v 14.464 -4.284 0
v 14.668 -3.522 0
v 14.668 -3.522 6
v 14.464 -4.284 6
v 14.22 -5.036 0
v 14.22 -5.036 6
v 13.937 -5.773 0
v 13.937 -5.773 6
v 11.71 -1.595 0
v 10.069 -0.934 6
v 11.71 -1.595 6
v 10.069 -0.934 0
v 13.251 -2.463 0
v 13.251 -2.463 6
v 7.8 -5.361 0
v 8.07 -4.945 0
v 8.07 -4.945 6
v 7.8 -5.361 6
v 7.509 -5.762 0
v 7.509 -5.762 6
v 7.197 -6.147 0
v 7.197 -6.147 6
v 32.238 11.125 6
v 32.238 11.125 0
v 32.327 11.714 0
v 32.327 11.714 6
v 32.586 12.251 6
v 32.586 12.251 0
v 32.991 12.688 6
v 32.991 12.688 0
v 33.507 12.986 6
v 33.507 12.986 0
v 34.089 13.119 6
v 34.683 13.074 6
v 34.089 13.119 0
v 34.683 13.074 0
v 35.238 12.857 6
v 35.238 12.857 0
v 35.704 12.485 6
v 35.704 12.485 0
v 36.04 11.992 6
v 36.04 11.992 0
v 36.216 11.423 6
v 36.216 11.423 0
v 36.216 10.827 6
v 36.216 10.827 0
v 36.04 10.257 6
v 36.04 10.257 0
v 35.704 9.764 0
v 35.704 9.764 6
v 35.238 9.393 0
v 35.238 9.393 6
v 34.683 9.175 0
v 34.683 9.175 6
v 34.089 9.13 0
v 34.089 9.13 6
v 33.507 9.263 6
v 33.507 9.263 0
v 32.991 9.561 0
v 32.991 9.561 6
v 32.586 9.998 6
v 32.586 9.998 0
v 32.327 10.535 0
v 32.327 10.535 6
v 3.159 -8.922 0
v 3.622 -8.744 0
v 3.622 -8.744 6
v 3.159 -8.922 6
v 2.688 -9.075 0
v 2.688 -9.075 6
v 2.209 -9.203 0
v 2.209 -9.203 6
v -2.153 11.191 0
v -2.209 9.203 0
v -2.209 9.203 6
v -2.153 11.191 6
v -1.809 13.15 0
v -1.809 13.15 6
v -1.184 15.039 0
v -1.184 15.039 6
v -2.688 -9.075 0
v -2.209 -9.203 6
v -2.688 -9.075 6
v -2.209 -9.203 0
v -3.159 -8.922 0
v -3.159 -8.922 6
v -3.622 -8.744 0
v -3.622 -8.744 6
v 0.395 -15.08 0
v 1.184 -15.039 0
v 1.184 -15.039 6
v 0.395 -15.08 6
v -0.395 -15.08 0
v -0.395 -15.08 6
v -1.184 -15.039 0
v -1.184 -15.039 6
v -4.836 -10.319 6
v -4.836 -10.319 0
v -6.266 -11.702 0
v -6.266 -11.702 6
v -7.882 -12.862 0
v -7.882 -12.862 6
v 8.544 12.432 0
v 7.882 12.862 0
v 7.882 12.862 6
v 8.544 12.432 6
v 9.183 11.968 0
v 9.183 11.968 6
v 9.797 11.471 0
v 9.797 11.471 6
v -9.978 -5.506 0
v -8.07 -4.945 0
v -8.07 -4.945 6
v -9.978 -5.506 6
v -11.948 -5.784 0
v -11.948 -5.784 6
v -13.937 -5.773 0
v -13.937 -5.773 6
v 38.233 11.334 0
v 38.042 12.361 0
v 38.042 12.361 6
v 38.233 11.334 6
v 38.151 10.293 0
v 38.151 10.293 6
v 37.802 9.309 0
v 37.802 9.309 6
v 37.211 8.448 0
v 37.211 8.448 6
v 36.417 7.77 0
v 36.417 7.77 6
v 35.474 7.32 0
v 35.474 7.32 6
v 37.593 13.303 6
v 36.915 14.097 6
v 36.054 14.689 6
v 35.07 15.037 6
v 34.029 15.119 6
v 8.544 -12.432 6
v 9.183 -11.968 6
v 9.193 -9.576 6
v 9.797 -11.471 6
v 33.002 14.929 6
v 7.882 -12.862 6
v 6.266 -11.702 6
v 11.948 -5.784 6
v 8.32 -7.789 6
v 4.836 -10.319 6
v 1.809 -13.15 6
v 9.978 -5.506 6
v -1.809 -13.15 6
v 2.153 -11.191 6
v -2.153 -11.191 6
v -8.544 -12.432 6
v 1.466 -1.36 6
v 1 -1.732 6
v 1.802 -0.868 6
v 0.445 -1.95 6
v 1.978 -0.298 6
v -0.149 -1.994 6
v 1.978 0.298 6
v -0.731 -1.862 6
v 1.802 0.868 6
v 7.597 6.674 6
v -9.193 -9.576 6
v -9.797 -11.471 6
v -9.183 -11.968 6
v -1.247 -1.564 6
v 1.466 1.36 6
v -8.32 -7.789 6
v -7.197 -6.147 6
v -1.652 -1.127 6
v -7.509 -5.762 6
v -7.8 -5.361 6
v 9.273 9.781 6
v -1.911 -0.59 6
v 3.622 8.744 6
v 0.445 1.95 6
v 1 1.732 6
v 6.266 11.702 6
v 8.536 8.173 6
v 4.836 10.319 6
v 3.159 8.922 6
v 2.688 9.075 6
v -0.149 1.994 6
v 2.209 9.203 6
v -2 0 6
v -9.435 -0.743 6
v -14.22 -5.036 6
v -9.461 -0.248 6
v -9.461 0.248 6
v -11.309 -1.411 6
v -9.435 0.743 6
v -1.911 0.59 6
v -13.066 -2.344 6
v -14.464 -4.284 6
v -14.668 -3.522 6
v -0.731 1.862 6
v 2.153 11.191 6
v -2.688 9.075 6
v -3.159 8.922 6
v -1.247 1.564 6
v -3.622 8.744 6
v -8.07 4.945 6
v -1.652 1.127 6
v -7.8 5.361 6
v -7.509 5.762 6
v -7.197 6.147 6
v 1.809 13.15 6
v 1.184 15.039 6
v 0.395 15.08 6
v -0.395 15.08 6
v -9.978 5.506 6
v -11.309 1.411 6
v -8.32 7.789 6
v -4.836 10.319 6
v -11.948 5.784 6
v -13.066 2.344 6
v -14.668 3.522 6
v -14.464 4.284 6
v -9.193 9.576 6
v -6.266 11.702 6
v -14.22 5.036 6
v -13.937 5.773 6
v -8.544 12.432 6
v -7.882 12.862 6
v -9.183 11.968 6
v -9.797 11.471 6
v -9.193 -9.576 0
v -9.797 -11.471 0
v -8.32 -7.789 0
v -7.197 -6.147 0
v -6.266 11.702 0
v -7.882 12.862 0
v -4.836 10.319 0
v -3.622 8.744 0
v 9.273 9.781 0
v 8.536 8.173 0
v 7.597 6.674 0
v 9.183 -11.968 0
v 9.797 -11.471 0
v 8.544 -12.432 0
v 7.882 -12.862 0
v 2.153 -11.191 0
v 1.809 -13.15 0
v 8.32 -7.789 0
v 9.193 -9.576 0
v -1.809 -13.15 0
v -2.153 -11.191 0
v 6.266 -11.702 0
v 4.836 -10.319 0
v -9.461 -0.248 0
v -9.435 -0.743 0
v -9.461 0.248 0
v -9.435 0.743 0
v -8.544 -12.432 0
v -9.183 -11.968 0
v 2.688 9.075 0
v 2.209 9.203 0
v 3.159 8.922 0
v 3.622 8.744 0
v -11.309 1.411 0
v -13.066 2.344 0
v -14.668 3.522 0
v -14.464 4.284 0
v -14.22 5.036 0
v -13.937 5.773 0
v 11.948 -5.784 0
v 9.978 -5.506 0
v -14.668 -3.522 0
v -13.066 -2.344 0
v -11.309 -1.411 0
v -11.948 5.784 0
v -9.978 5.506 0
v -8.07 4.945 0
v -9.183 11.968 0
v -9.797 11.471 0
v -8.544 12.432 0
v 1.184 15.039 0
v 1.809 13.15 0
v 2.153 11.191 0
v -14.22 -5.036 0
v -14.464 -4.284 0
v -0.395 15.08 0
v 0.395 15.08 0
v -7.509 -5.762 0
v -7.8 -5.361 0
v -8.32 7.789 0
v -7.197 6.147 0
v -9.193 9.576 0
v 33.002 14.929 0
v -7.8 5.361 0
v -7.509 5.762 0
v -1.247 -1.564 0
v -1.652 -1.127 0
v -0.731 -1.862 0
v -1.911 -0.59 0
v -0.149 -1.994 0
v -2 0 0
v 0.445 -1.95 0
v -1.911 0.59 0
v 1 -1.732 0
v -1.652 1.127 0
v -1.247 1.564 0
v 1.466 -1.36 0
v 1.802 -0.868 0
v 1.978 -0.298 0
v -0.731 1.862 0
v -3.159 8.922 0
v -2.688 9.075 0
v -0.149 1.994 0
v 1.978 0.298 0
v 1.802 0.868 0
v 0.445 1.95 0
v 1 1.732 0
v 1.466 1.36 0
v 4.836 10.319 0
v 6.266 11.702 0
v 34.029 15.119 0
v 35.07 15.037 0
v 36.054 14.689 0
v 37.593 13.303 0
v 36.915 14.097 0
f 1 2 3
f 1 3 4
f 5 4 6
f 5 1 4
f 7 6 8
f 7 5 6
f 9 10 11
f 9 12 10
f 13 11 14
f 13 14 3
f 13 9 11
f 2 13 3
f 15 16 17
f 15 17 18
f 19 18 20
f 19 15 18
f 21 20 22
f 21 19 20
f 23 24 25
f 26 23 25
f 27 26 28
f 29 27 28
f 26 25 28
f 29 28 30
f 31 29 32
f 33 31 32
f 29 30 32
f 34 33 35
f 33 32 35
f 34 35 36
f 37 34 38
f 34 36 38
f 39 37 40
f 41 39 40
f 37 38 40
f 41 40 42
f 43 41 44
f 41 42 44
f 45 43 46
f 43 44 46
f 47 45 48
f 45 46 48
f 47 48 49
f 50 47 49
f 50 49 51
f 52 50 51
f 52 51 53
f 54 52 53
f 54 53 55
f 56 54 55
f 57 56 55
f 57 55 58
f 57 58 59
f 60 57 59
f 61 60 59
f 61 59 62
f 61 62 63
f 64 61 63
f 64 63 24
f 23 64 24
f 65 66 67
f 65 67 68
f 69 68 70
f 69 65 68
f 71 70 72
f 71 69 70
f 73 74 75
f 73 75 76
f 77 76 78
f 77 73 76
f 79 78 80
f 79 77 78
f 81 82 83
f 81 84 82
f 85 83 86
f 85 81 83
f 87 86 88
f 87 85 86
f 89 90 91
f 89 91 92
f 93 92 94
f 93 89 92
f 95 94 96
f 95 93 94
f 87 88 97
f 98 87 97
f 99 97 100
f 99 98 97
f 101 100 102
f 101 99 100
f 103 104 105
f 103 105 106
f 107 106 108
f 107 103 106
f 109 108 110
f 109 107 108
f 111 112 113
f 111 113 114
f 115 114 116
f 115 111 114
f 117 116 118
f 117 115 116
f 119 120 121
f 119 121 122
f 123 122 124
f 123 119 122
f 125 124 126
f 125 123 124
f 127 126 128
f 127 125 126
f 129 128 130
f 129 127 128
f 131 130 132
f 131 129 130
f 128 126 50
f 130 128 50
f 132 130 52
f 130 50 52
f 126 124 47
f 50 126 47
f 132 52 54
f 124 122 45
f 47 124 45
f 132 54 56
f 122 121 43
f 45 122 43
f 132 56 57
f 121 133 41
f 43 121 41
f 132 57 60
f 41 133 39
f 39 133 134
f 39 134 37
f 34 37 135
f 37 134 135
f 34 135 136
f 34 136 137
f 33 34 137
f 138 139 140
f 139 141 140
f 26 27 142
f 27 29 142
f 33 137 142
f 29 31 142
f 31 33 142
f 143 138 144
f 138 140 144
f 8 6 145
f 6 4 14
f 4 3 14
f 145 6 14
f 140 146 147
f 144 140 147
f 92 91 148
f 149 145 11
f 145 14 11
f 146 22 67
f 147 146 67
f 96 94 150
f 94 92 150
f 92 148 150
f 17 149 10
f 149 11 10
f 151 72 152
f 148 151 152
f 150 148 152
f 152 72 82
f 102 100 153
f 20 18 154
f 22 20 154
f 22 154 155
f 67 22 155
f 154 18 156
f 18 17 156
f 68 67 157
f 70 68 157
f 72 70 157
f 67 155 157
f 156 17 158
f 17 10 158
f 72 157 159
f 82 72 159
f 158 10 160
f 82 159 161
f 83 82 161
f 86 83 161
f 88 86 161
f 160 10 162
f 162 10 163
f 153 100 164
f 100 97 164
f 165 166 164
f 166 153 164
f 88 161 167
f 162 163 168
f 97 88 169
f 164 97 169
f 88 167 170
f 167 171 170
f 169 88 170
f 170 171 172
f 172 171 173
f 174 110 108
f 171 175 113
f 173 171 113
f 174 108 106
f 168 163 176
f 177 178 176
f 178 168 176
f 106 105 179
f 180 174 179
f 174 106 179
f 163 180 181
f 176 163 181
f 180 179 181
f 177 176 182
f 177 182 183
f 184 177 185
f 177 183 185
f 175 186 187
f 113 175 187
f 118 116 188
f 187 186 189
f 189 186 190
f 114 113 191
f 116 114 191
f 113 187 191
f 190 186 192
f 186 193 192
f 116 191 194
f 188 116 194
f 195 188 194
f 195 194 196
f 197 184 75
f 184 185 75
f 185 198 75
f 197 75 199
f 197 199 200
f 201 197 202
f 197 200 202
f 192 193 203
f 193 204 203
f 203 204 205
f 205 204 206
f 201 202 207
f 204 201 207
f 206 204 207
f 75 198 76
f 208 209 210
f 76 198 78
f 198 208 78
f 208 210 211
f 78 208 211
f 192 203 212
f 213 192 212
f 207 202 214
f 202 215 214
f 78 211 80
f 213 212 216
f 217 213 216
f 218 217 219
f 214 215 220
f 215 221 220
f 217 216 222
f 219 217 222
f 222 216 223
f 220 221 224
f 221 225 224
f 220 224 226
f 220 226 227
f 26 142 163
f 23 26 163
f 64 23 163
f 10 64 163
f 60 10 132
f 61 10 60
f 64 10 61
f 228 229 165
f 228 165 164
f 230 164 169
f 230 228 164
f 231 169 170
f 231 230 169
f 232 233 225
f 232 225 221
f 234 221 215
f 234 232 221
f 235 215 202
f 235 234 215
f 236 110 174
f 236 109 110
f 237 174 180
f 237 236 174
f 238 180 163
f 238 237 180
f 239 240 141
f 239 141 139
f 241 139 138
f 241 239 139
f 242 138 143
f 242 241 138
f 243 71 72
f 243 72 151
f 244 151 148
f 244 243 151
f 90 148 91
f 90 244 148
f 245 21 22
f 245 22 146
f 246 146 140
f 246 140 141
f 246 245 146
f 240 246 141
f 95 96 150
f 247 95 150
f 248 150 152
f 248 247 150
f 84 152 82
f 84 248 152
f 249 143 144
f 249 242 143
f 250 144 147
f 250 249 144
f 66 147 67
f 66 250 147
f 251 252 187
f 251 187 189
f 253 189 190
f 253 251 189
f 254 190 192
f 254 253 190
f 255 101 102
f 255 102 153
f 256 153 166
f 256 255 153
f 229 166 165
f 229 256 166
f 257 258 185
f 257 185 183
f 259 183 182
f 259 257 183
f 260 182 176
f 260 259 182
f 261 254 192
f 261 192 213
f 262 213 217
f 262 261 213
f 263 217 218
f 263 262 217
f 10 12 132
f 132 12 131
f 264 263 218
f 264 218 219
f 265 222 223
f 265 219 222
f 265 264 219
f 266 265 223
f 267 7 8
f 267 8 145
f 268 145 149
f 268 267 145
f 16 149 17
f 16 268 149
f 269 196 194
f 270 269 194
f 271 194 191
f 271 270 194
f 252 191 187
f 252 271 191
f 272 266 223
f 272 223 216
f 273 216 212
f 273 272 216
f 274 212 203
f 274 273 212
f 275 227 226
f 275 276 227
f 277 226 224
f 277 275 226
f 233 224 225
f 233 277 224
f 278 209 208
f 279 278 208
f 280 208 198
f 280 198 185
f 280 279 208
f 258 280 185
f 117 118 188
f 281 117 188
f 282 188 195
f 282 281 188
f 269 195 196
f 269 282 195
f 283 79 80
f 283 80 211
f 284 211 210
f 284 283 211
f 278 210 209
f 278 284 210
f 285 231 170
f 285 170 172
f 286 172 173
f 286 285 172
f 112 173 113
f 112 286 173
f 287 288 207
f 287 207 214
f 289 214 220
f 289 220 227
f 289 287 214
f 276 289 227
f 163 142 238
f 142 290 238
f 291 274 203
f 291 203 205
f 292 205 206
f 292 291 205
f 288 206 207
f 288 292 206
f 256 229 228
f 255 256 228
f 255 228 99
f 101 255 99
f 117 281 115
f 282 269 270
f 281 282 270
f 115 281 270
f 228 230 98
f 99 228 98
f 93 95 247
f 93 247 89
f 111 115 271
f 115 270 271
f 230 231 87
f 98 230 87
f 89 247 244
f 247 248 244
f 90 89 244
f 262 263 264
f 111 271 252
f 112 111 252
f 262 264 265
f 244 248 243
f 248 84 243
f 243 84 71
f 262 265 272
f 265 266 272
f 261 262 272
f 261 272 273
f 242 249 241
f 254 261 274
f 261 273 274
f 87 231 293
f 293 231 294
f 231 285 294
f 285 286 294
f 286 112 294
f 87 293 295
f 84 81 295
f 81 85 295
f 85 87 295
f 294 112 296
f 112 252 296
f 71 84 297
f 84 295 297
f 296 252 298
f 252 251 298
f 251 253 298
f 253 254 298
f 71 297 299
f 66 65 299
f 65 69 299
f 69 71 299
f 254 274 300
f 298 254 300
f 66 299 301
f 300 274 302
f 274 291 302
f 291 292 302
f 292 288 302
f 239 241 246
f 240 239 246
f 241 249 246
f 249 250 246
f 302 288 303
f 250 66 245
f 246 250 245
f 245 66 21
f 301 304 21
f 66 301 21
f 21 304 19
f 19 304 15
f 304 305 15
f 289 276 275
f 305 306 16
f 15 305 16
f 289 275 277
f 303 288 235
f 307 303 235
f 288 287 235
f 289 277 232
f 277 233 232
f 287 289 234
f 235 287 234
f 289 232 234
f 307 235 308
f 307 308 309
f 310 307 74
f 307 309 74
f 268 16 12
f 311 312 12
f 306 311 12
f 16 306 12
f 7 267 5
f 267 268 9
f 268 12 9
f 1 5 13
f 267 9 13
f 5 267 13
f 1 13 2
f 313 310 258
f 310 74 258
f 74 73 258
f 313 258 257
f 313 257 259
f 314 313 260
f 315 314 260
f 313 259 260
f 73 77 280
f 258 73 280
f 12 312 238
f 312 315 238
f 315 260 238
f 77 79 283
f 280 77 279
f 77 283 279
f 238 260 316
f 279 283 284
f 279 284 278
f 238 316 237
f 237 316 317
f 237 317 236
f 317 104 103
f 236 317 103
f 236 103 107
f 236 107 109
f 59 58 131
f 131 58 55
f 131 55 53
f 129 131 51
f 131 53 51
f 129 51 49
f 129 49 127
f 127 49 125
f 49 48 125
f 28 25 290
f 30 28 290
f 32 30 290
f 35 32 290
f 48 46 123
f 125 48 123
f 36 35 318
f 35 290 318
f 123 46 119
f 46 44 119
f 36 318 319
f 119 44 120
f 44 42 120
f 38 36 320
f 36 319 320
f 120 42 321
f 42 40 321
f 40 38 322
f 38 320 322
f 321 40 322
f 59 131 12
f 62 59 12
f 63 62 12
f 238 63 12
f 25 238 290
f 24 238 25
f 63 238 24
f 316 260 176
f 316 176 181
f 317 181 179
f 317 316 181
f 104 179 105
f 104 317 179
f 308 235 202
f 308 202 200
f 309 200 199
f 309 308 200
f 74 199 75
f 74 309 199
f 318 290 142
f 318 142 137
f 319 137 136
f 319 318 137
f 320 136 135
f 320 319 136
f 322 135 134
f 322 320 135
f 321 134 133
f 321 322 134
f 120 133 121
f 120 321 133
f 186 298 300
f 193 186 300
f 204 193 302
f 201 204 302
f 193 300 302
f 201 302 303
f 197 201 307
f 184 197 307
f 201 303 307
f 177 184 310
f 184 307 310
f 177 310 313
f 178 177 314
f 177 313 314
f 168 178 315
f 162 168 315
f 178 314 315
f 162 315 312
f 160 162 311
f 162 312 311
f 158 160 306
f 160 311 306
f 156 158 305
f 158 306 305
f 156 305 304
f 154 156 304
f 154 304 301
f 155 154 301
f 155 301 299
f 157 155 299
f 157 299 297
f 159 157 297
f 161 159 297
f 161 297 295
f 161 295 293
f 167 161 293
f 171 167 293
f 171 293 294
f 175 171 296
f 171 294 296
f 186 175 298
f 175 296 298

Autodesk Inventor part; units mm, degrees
sketch "Sketch1" plane through (0, 0, 0) normal (0, 0, 1) x (1, 0, 0)
  circle A0 centre (0, 0) radius 15.0851
  dimension "d0" = 30.1702
extrude "Extrusion1" add sketch "Sketch1" along normal blind 6
ref_plane "Work Plane2" through (0, 0, 3) normal (0, 0, 1) x (-1, 0, 0)
sketch "Sketch2" plane through (0, 0, 0) normal (0, 0, -1) x (-1, 0, 0)
  circle A0 centre (0, 0) radius 15.0851 projected
  circle A1 centre (0, 0) radius 12.5
  dimension "d3" = 25
surface extrude "Pitch Diameter" sketch "Sketch2" against normal through all shown no curves A1
ref_plane "Work Plane8" through (0, 0, 0) normal (0.9510565, 0.309017, 0) x (0, 0, 1)
ref_plane "Work Plane9" through (0, 0, 0) normal (1, 0, 0) x (0, 1, 0)
spur gear teeth "Spur Gear" teeth 10 pitch diameter 25 tip diameter 30.1702 root diameter 18.9292 face width 6 start plane through (0, 0, 0) normal (0, 0, -1) x (-1, 0, 0)
sketch "Sketch3" plane through (0, 0, 0) normal (0, 0, -1) x (-1, 0, 0)
  circle A0 centre (0, 0) radius 2
  dimension "d49" = 4
extrude "Extrusion2" cut sketch "Sketch3" against normal up to surface (6 mm away)
sketch "Sketch4" plane through (0, 0, 0) normal (0, 0, -1) x (-1, 0, 0)
  circle A0 centre (-26.4586, 35.0672) radius 2 projected
  line L0 (-4.8178, 32.2415) -> (-25.2225, 38.8714) projected
  arc A1 (-25.2225, 38.8714) -> (-27.6947, 31.263) centre (-26.4586, 35.0672) ccw projected
  line L1 (-27.6947, 31.263) -> (-7.2899, 24.6331) projected
  arc A2 (-7.2899, 24.6331) -> (-7.2592, 22.759) centre (7.7794, 23.9426) ccw projected
  arc A3 (-7.2592, 22.759) -> (-1.4237, 21.7331) centre (-2.0301, 35.3932) ccw projected
  arc A4 (-1.4237, 21.7331) -> (-0.9647, 20.3206) centre (7.7794, 23.9426) ccw projected
  arc A5 (-0.9647, 20.3206) -> (-5.0828, 16.0606) centre (6.5738, 8.913) ccw projected
  arc A6 (-5.0828, 16.0606) -> (-3.6914, 14.1456) centre (7.7794, 23.9426) ccw projected
  arc A7 (-3.6914, 14.1456) -> (1.6326, 16.7456) centre (-6.8872, 27.4404) ccw projected
  arc A8 (1.6326, 16.7456) -> (2.8342, 15.8727) centre (7.7794, 23.9426) ccw projected
  arc A9 (2.8342, 15.8727) -> (2.0066, 10.0058) centre (15.6383, 11.0747) ccw projected
  arc A10 (2.0066, 10.0058) -> (4.2579, 9.2743) centre (7.7794, 23.9426) ccw projected
  arc A11 (4.2579, 9.2743) -> (7.0368, 14.5072) centre (-6.1421, 18.1516) ccw projected
  arc A12 (7.0368, 14.5072) -> (8.522, 14.5072) centre (7.7794, 23.9426) ccw projected
  arc A13 (8.522, 14.5072) -> (11.301, 9.2743) centre (21.7009, 18.1516) ccw projected
  arc A14 (11.301, 9.2743) -> (13.5522, 10.0058) centre (7.7794, 23.9426) ccw projected
  arc A15 (13.5522, 10.0058) -> (12.7247, 15.8727) centre (-0.0794, 11.0747) ccw projected
  arc A16 (12.7247, 15.8727) -> (13.9262, 16.7456) centre (7.7794, 23.9426) ccw projected
  arc A17 (13.9262, 16.7456) -> (19.2502, 14.1456) centre (22.446, 27.4404) ccw projected
  arc A18 (19.2502, 14.1456) -> (20.6416, 16.0606) centre (7.7794, 23.9426) ccw projected
  arc A19 (20.6416, 16.0606) -> (16.5236, 20.3206) centre (8.985, 8.913) ccw projected
  arc A20 (16.5236, 20.3206) -> (16.9825, 21.7331) centre (7.7794, 23.9426) ccw projected
  arc A21 (16.9825, 21.7331) -> (22.818, 22.759) centre (17.589, 35.3932) ccw projected
  arc A22 (22.818, 22.759) -> (22.818, 25.1262) centre (7.7794, 23.9426) ccw projected
  arc A23 (22.818, 25.1262) -> (16.9825, 26.1521) centre (17.589, 12.492) ccw projected
  arc A24 (16.9825, 26.1521) -> (16.5236, 27.5646) centre (7.7794, 23.9426) ccw projected
  arc A25 (16.5236, 27.5646) -> (20.6416, 31.8246) centre (8.985, 38.9722) ccw projected
  arc A26 (20.6416, 31.8246) -> (19.2502, 33.7396) centre (7.7794, 23.9426) ccw projected
  arc A27 (19.2502, 33.7396) -> (13.9262, 31.1396) centre (22.446, 20.4448) ccw projected
  arc A28 (13.9262, 31.1396) -> (12.7247, 32.0125) centre (7.7794, 23.9426) ccw projected
  arc A29 (12.7247, 32.0125) -> (13.5522, 37.8794) centre (-0.0794, 36.8105) ccw projected
  arc A30 (13.5522, 37.8794) -> (11.301, 38.6109) centre (7.7794, 23.9426) ccw projected
  arc A31 (11.301, 38.6109) -> (8.522, 33.378) centre (21.7009, 29.7336) ccw projected
  arc A32 (8.522, 33.378) -> (7.0368, 33.378) centre (7.7794, 23.9426) ccw projected
  arc A33 (7.0368, 33.378) -> (4.2579, 38.6109) centre (-6.1421, 29.7336) ccw projected
  arc A34 (4.2579, 38.6109) -> (2.0066, 37.8794) centre (7.7794, 23.9426) ccw projected
  arc A35 (2.0066, 37.8794) -> (2.8342, 32.0125) centre (15.6383, 36.8105) ccw projected
  arc A36 (2.8342, 32.0125) -> (1.6326, 31.1396) centre (7.7794, 23.9426) ccw projected
  arc A37 (1.6326, 31.1396) -> (-3.6914, 33.7396) centre (-6.8872, 20.4448) ccw projected
  arc A38 (-3.6914, 33.7396) -> (-4.8178, 32.2415) centre (7.7794, 23.9426) ccw projected
  circle A39 centre (7.7794, 23.9426) radius 1.5 projected
  line L2 (-1.2361, -3.8042) -> (-35.4741, 7.3204)
  line L3 (-38.0423, 12.3607) -> (-38.0423, 12.3607)
  line L4 (-33.002, 14.9288) -> (1.2361, 3.8042)
  line L5 (1.2361, 3.8042) -> (-1.2361, -3.8042)
  circle A40 centre (-34.238, 11.1246) radius 2
  arc A41 (-38.0423, 12.3607) -> (-35.4741, 7.3204) centre (-34.238, 11.1246) ccw
  arc A42 (-33.002, 14.9288) -> (-38.0423, 12.3607) centre (-34.238, 11.1246) ccw
  line L6 (-6.619, 6.3565) -> (-9.0911, -1.252)
  point P0 (0, 0)
  point P1 (-36.8062, 16.1649)
  point P2 (-39.2783, 8.5565)
  point P3 (-38.0423, 12.3607)
  dimension "d61" = 40
  dimension "d62" = 8
  dimension "d63" = 4
  dimension "d64" = 0
  dimension "d65" = 4
  dimension "d66" = 4
  dimension "d67" = 4
extrude "Extrusion3" add sketch "Sketch4" against normal up to surface (6 mm away) contours L2 A41 A42 L4 L6
equation "\"d0\" = da_da"
equation "\"d1\" = da_b"
equation "\"d3\" = da_d"
equation "\"d16\" = da_aw"
equation "\"d43\" = da_aw"
equation "\"d46\" = da_aw"
equation "\"da_da\" = 30.170238"
equation "\"da_b\" = 6"
equation "\"da_d\" = 25"
equation "\"da_aw\" = 25.174739"
properties part number "Spur Gear2" material "Steel"
